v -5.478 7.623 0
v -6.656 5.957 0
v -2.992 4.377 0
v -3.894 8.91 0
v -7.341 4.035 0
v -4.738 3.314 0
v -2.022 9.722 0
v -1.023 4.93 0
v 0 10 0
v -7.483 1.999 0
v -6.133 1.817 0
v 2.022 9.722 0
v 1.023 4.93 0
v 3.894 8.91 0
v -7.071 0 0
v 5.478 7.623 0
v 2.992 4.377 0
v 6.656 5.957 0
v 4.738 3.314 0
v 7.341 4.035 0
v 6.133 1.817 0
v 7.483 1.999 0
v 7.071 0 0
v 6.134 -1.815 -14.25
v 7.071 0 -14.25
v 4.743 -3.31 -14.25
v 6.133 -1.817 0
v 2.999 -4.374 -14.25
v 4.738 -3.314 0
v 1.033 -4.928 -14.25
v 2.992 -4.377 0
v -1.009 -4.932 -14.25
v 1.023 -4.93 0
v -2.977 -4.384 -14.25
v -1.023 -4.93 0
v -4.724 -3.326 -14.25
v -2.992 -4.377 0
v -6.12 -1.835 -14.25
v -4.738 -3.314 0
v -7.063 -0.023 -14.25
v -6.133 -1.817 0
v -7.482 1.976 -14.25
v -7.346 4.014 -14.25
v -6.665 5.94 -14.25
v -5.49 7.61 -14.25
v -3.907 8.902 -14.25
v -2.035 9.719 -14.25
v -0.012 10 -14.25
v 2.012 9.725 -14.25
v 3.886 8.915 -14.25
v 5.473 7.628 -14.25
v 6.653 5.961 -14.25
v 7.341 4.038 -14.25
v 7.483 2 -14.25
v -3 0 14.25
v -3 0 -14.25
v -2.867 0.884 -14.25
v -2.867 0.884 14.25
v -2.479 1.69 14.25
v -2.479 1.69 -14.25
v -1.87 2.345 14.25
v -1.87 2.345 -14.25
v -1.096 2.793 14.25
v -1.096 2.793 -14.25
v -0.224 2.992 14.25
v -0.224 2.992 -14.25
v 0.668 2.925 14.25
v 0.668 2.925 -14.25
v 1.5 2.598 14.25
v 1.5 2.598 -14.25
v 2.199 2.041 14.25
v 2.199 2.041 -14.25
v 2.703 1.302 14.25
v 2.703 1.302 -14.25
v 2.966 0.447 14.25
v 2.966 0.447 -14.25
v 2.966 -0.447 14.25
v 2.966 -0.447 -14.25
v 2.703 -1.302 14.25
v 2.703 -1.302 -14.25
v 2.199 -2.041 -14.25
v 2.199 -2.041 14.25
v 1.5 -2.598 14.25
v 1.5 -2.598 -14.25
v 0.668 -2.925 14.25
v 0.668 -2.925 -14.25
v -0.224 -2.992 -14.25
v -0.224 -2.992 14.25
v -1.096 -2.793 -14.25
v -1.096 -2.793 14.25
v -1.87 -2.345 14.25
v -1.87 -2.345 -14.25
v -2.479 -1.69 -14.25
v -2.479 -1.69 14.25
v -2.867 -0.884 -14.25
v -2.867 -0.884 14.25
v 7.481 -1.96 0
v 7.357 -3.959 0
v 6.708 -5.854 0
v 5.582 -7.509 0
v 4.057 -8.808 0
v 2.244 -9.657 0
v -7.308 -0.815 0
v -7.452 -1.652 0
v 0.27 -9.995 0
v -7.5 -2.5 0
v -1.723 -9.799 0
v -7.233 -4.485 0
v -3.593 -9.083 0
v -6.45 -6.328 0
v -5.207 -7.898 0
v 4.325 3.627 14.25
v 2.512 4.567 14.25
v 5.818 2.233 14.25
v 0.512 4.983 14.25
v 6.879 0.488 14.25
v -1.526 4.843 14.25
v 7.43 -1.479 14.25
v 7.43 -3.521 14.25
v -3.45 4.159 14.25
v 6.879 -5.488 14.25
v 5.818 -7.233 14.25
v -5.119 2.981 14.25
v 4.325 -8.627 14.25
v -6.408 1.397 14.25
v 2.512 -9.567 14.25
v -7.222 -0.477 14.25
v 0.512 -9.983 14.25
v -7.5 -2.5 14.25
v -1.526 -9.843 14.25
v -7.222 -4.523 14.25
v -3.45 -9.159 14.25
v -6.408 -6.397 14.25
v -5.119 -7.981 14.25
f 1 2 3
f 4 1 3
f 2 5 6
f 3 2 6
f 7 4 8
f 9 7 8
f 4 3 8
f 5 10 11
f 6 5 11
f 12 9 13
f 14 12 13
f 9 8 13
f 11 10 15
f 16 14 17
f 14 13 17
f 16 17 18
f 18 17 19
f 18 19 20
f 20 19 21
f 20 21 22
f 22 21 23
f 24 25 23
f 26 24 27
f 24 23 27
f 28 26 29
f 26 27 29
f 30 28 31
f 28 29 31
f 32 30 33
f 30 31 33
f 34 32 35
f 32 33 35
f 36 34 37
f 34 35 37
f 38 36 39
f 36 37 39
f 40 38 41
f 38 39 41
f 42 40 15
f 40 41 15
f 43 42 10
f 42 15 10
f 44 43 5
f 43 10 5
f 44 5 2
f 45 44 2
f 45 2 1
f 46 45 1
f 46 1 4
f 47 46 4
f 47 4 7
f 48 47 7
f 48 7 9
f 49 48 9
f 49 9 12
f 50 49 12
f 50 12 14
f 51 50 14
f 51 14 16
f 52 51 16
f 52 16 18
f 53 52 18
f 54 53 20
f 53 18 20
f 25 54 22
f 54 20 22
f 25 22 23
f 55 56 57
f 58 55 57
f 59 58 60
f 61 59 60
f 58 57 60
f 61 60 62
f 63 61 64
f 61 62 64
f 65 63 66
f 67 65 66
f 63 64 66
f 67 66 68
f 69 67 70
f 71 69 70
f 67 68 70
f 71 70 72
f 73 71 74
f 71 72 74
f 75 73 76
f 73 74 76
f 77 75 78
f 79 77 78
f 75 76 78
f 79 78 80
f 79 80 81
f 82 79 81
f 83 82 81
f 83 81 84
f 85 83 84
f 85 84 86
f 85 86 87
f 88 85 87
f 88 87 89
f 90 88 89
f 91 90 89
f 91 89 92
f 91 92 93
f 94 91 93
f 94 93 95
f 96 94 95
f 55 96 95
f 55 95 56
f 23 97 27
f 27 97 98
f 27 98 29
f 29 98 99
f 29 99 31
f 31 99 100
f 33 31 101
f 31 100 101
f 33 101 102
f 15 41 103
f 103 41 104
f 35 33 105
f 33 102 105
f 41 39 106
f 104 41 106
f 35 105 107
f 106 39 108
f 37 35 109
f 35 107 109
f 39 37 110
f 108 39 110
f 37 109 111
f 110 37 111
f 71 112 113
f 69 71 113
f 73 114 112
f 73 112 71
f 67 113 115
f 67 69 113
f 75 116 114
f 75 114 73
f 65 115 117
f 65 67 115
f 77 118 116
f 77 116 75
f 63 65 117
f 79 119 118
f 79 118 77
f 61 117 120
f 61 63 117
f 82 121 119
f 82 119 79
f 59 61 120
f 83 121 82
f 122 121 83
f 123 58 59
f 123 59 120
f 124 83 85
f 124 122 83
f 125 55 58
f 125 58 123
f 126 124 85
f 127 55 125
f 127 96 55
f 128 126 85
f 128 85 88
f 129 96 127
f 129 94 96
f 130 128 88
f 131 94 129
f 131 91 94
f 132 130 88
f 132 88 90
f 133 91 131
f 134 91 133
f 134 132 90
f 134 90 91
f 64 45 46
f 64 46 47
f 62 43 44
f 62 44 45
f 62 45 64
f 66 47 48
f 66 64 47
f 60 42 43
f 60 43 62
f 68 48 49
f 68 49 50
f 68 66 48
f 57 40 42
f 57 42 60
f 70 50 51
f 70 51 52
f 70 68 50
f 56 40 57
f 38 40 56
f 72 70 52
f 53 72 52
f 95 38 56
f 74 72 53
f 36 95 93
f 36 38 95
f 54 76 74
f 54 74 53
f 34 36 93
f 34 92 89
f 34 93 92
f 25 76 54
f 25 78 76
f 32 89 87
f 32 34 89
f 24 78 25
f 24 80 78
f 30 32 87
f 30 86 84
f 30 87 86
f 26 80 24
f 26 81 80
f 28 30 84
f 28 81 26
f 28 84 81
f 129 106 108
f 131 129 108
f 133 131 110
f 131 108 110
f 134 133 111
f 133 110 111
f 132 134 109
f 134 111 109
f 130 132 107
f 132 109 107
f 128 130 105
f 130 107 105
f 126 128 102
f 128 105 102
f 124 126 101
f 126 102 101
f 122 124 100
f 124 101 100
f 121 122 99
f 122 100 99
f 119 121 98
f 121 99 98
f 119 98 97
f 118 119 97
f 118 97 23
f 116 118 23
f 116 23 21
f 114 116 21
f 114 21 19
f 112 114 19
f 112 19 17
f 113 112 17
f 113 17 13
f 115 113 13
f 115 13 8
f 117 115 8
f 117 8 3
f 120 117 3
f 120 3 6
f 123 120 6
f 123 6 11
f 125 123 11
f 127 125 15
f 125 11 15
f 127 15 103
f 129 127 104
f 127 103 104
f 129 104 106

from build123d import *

# Parameters (mm, degrees)
SKETCH1_R           = 7.5
BOSS_EXTRUDE1_DEPTH = 14.25
SKETCH2_R           = 7.5
BOSS_EXTRUDE2_DEPTH = 14.25
SKETCH3_R           = 3
CUT_EXTRUDE1_DEPTH  = 32.120732639


with BuildPart() as part:
    # Sketch1 → Boss-Extrude1 (new body)
    with BuildSketch(Plane.XY):
        with Locations(Location((0, -2.5, 0), (0, 0, 180))):
            Circle(SKETCH1_R)
    extrude(amount=BOSS_EXTRUDE1_DEPTH)

    # Sketch2 → Boss-Extrude2 (add)
    with BuildSketch(Plane(origin=(0, 0, 0), x_dir=(-1, 0, 0), z_dir=(0, 0, -1))):
        with Locations(Location((0, 2.5, 0), (0, 0, 199.471220634))):
            Circle(SKETCH2_R)
    extrude(amount=BOSS_EXTRUDE2_DEPTH)

    # Sketch3 → Cut-Extrude1 (cut, through all)
    with BuildSketch(Plane(origin=(0, 0, -14.25), x_dir=(-1, 0, 0), z_dir=(0, 0, -1))):
        Circle(SKETCH3_R)
    extrude(amount=-CUT_EXTRUDE1_DEPTH, mode=Mode.SUBTRACT)


solid = part.part
